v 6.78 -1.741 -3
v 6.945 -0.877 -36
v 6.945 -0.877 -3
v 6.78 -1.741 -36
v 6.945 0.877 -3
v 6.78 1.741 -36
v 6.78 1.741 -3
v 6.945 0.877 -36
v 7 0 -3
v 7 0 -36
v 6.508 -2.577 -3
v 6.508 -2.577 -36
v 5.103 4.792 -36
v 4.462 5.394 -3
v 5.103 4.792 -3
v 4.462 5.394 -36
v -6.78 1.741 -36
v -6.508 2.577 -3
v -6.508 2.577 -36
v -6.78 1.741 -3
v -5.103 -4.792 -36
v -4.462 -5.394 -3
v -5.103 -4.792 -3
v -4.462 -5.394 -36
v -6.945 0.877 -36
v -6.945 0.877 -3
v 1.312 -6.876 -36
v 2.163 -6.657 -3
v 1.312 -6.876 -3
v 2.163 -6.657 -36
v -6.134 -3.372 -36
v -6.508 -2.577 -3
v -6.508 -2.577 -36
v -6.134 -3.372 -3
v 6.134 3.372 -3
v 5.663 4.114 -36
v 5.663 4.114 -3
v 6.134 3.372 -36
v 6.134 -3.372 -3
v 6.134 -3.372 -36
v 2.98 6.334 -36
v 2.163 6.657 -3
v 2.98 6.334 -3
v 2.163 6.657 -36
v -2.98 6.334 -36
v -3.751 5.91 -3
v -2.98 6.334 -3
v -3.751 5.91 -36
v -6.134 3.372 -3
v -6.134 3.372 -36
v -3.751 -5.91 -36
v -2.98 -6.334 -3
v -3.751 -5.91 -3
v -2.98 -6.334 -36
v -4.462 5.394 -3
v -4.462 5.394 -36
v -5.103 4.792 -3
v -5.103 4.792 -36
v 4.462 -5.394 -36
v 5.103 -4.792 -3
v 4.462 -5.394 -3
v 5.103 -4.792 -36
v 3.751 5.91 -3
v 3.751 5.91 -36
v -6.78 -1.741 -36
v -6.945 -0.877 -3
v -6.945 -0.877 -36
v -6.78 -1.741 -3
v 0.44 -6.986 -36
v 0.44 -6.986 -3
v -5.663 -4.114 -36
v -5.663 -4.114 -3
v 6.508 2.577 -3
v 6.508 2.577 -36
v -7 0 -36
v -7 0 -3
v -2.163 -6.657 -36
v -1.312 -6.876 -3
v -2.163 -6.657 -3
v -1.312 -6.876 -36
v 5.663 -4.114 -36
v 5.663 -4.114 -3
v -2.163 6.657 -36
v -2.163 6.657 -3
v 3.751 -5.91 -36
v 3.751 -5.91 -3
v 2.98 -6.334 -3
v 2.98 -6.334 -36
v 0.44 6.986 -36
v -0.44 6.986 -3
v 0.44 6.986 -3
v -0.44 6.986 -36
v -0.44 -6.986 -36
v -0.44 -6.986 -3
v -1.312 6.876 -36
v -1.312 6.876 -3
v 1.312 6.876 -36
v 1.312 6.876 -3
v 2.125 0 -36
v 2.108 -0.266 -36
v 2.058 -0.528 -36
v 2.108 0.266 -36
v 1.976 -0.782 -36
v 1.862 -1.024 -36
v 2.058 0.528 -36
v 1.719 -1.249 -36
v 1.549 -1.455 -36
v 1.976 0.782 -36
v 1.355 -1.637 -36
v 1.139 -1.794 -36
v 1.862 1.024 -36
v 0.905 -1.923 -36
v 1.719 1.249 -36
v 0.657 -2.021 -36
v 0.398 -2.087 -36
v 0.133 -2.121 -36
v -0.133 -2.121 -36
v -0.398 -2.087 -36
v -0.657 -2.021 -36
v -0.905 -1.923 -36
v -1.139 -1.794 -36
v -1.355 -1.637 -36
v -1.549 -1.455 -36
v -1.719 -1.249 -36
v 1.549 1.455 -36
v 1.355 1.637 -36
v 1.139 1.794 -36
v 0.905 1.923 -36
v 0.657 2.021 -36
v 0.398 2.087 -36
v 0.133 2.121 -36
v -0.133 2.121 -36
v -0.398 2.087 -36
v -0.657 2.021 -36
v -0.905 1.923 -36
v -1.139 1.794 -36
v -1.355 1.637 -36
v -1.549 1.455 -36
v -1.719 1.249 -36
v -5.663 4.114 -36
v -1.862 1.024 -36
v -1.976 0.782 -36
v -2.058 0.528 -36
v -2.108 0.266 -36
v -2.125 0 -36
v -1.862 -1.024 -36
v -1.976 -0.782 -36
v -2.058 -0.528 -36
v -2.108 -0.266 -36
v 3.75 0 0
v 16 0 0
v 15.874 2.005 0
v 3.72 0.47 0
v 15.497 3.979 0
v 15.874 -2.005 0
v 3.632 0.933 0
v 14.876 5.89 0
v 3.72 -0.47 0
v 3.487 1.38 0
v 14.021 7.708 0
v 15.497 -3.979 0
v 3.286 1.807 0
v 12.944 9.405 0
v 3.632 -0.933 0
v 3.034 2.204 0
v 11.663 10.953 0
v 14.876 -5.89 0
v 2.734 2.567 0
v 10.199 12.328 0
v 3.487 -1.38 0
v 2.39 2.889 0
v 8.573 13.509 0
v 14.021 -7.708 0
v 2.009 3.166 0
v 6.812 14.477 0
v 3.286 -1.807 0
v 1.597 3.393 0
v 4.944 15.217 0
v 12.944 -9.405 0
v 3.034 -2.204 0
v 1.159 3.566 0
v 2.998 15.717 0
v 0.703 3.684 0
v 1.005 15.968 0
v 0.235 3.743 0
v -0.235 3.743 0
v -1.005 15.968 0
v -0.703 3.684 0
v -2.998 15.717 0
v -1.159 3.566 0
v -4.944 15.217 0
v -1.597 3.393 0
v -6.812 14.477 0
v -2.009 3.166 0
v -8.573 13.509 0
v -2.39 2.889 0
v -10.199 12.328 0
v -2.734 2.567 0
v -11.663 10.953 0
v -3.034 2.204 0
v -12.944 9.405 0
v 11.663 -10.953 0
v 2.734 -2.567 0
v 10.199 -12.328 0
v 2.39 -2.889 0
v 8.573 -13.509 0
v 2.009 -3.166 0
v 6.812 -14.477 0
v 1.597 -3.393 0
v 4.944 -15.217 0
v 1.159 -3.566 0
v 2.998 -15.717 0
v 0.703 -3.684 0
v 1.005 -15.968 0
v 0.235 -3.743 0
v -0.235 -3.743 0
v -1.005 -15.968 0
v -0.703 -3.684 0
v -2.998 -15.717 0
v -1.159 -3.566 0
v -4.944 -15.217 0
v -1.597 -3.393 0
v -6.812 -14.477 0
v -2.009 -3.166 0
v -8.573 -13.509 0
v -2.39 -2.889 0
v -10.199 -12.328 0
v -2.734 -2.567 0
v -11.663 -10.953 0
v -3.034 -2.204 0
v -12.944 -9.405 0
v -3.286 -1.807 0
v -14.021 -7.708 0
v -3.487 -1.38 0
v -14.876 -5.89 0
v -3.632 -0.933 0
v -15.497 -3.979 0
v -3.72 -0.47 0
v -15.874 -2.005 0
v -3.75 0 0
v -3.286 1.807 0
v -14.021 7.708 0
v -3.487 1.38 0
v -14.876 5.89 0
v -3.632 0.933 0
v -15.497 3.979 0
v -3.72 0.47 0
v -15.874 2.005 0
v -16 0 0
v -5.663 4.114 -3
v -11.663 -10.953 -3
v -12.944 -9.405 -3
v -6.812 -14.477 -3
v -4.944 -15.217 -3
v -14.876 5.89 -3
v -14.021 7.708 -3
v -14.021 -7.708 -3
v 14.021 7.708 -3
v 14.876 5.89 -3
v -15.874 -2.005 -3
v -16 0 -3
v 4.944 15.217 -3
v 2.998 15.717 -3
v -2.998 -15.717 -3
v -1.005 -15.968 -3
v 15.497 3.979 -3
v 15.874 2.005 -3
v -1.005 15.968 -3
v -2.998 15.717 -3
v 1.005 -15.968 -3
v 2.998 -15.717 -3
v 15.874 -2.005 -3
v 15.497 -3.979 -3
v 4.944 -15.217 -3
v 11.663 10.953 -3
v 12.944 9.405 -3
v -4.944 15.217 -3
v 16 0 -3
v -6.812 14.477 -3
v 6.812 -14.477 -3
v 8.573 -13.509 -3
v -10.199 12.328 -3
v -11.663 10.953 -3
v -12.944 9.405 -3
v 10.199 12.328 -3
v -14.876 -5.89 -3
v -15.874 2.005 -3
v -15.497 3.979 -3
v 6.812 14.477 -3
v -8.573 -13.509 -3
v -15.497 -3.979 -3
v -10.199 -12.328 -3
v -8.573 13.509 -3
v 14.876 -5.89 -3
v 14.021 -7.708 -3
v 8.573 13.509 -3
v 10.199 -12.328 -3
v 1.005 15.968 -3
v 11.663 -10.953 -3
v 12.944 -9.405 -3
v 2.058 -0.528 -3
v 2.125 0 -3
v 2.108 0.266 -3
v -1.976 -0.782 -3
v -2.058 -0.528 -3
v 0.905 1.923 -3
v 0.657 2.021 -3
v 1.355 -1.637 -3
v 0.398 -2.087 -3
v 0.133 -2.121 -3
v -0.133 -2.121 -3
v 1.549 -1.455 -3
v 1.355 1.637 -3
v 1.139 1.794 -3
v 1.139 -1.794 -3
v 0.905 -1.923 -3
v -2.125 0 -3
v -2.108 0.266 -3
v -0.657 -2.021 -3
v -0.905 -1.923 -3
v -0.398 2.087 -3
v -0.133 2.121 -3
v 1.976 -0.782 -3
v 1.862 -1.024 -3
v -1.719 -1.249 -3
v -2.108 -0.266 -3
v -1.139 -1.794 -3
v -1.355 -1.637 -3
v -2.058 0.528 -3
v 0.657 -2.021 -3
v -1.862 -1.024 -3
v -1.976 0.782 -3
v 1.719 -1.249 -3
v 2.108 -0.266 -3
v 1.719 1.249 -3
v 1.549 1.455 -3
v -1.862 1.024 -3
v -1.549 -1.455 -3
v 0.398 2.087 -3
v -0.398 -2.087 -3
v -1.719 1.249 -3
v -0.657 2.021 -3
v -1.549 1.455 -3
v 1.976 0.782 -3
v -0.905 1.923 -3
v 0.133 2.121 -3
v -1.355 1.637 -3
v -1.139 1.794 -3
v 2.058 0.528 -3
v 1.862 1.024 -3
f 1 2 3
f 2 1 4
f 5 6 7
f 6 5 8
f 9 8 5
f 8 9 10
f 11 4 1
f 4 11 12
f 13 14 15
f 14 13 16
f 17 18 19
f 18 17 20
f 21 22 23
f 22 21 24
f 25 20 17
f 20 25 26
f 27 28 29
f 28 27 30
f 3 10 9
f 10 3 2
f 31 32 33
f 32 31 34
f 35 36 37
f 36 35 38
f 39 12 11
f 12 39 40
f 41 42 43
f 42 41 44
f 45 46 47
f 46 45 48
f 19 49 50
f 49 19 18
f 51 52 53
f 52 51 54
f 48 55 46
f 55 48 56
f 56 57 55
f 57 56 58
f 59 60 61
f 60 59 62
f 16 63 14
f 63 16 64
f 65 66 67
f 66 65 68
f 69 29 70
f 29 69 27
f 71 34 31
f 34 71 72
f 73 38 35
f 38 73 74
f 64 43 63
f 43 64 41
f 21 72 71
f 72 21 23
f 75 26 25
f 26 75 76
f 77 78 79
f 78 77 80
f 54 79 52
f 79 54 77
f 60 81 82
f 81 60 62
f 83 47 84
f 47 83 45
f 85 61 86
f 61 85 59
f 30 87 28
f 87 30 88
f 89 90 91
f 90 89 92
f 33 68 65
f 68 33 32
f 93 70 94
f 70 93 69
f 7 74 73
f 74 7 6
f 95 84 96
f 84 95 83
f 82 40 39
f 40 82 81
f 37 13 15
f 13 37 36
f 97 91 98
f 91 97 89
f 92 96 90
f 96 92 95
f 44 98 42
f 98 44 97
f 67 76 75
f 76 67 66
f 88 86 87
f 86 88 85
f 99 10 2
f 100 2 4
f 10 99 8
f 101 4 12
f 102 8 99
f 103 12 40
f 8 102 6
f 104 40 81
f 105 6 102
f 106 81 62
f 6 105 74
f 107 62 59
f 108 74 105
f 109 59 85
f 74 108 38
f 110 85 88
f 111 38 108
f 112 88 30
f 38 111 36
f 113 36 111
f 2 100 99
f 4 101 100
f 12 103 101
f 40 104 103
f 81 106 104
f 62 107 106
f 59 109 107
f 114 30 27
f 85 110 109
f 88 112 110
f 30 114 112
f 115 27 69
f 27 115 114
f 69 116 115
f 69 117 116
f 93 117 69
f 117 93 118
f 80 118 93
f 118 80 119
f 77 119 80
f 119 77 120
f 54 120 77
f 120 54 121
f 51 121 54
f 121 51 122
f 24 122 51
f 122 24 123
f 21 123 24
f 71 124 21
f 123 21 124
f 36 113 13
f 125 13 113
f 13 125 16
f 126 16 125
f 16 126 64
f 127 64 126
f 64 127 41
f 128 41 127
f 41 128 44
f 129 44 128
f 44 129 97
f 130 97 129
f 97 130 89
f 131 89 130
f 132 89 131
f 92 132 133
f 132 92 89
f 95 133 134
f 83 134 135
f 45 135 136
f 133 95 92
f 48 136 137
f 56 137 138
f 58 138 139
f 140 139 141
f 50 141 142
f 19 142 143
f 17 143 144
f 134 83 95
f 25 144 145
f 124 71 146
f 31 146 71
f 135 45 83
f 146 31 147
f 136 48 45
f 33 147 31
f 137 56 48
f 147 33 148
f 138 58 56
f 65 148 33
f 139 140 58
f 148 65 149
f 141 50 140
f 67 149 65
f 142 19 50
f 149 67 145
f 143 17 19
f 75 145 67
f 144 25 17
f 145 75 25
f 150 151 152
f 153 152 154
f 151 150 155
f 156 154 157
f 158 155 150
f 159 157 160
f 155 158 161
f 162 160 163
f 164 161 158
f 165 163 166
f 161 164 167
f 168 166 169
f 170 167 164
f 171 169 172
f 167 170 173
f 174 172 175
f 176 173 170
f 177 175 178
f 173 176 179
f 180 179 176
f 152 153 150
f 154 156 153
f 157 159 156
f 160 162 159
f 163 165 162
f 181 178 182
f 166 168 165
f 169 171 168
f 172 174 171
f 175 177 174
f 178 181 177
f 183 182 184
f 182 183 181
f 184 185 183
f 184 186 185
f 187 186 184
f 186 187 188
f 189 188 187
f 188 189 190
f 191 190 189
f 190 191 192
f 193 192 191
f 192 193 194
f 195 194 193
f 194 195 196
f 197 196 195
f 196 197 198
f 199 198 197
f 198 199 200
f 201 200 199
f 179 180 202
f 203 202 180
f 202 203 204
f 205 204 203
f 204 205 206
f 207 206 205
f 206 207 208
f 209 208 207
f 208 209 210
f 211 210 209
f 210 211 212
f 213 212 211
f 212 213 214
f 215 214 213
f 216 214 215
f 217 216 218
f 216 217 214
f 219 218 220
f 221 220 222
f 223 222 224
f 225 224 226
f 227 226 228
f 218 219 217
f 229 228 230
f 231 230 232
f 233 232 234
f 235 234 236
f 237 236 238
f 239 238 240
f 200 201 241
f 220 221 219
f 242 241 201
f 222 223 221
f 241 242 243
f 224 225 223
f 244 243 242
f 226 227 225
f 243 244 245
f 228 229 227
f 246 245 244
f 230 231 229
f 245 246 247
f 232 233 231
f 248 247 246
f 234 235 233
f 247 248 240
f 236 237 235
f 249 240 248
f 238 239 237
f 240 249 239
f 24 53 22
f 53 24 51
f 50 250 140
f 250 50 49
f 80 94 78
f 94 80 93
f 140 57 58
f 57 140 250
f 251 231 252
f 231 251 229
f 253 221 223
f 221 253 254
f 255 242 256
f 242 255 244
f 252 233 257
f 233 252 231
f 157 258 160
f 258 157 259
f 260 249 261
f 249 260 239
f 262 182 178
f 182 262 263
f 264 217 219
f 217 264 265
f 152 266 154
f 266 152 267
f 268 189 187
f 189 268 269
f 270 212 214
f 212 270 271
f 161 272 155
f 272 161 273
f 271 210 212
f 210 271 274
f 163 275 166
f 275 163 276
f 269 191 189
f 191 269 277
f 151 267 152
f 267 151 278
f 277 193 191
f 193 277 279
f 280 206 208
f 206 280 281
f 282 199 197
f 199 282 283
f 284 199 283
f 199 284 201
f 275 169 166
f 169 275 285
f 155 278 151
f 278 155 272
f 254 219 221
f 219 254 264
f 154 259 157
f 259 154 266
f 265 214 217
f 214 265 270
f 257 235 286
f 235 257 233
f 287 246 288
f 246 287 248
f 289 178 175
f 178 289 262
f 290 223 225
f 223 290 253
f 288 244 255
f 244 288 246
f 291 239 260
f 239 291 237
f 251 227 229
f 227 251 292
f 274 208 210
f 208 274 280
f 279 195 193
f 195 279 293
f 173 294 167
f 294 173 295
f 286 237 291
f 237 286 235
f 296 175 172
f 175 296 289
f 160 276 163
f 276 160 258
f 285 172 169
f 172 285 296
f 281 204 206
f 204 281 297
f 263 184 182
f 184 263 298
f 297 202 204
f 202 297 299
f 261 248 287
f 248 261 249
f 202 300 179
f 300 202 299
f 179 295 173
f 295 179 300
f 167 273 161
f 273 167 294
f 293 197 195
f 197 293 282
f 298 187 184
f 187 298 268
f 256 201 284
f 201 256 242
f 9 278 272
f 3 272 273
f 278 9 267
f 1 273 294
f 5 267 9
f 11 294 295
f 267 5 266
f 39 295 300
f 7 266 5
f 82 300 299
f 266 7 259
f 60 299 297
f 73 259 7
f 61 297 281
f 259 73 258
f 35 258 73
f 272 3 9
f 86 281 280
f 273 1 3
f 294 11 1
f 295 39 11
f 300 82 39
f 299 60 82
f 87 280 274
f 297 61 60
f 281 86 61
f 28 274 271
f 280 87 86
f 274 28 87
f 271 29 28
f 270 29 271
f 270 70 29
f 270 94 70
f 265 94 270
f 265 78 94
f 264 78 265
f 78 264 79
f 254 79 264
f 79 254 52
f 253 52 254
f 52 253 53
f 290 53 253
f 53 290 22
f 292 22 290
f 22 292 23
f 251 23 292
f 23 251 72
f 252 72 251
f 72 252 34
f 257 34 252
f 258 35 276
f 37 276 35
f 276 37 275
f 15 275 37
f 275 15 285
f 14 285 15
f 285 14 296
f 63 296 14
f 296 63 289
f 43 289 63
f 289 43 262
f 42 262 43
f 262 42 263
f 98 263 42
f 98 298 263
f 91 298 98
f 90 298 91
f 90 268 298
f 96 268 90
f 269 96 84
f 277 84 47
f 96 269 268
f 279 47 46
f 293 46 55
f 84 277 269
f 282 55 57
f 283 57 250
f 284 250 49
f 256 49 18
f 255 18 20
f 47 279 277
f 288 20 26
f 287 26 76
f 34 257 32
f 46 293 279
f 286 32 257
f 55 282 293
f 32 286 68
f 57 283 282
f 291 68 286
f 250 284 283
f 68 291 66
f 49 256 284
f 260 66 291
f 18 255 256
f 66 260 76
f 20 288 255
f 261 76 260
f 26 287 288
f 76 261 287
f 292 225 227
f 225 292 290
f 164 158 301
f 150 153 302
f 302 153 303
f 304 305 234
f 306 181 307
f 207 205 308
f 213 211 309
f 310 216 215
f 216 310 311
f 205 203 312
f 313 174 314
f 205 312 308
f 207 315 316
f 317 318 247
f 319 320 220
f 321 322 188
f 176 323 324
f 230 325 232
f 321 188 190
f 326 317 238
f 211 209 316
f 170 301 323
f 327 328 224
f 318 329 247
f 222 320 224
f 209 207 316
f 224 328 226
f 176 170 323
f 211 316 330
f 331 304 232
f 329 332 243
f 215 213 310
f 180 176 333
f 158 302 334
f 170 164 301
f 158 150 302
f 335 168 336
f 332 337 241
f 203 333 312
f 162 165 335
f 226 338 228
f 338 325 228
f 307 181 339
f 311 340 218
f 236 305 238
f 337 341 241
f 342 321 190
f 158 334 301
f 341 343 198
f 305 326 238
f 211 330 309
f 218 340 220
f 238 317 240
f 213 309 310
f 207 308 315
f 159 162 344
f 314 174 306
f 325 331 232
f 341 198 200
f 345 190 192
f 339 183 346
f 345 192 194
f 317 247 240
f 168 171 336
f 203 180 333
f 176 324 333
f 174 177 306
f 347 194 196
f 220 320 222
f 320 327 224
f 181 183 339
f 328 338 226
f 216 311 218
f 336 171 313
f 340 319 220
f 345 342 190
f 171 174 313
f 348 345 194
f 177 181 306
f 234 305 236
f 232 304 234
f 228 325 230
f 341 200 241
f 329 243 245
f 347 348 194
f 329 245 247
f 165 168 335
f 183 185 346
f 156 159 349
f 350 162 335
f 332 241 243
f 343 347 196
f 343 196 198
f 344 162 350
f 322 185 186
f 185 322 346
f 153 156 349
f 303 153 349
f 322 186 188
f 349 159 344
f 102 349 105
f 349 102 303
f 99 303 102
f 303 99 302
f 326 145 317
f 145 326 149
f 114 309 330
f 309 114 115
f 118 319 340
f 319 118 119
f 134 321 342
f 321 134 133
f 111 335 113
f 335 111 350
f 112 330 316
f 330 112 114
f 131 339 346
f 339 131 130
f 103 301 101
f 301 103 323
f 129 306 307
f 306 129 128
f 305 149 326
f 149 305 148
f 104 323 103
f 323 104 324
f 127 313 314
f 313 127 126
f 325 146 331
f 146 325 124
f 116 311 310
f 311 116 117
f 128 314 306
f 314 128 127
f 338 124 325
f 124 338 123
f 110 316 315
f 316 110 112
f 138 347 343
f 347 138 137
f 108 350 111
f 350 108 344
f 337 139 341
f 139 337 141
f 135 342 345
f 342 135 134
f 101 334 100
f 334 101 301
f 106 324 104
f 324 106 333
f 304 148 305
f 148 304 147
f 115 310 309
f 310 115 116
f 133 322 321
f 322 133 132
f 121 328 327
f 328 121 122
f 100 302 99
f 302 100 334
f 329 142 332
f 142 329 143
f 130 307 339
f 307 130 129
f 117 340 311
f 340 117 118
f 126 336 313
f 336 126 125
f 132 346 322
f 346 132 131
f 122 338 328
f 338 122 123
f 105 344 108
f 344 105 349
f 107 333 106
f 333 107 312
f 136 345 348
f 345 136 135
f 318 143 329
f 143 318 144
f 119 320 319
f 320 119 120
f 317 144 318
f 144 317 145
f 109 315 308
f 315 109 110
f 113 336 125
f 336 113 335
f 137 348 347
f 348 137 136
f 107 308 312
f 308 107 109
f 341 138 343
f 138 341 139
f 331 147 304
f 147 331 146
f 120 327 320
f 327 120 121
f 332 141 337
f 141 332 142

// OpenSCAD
$fn = 50;


difference() {
	union() {
		translate(v = [0, 0, -36.0000000000]) {
			cylinder(h = 36, r = 7.0000000000);
		}
		translate(v = [0, 0, -3.0000000000]) {
			cylinder(h = 3, r = 16.0000000000);
		}
	}
	union() {
		translate(v = [0, 0, 0]) {
			rotate(a = [0, 0, 0]) {
				difference() {
					union() {
						#translate(v = [0, 0, -36.0000000000]) {
							cylinder(h = 36, r = 2.0000000000);
						}
						#translate(v = [0, 0, -3]) {
							cylinder(h = 3, r = 7.0000000000, r1 = 2.1250000000, r2 = 3.7500000000);
						}
						#translate(v = [0, 0, -36.0000000000]) {
							cylinder(h = 36, r = 2.1250000000);
						}
						#translate(v = [0, 0, -36.0000000000]) {
							cylinder(h = 36, r = 2.0000000000);
						}
					}
					union();
				}
			}
		}
	}
}
